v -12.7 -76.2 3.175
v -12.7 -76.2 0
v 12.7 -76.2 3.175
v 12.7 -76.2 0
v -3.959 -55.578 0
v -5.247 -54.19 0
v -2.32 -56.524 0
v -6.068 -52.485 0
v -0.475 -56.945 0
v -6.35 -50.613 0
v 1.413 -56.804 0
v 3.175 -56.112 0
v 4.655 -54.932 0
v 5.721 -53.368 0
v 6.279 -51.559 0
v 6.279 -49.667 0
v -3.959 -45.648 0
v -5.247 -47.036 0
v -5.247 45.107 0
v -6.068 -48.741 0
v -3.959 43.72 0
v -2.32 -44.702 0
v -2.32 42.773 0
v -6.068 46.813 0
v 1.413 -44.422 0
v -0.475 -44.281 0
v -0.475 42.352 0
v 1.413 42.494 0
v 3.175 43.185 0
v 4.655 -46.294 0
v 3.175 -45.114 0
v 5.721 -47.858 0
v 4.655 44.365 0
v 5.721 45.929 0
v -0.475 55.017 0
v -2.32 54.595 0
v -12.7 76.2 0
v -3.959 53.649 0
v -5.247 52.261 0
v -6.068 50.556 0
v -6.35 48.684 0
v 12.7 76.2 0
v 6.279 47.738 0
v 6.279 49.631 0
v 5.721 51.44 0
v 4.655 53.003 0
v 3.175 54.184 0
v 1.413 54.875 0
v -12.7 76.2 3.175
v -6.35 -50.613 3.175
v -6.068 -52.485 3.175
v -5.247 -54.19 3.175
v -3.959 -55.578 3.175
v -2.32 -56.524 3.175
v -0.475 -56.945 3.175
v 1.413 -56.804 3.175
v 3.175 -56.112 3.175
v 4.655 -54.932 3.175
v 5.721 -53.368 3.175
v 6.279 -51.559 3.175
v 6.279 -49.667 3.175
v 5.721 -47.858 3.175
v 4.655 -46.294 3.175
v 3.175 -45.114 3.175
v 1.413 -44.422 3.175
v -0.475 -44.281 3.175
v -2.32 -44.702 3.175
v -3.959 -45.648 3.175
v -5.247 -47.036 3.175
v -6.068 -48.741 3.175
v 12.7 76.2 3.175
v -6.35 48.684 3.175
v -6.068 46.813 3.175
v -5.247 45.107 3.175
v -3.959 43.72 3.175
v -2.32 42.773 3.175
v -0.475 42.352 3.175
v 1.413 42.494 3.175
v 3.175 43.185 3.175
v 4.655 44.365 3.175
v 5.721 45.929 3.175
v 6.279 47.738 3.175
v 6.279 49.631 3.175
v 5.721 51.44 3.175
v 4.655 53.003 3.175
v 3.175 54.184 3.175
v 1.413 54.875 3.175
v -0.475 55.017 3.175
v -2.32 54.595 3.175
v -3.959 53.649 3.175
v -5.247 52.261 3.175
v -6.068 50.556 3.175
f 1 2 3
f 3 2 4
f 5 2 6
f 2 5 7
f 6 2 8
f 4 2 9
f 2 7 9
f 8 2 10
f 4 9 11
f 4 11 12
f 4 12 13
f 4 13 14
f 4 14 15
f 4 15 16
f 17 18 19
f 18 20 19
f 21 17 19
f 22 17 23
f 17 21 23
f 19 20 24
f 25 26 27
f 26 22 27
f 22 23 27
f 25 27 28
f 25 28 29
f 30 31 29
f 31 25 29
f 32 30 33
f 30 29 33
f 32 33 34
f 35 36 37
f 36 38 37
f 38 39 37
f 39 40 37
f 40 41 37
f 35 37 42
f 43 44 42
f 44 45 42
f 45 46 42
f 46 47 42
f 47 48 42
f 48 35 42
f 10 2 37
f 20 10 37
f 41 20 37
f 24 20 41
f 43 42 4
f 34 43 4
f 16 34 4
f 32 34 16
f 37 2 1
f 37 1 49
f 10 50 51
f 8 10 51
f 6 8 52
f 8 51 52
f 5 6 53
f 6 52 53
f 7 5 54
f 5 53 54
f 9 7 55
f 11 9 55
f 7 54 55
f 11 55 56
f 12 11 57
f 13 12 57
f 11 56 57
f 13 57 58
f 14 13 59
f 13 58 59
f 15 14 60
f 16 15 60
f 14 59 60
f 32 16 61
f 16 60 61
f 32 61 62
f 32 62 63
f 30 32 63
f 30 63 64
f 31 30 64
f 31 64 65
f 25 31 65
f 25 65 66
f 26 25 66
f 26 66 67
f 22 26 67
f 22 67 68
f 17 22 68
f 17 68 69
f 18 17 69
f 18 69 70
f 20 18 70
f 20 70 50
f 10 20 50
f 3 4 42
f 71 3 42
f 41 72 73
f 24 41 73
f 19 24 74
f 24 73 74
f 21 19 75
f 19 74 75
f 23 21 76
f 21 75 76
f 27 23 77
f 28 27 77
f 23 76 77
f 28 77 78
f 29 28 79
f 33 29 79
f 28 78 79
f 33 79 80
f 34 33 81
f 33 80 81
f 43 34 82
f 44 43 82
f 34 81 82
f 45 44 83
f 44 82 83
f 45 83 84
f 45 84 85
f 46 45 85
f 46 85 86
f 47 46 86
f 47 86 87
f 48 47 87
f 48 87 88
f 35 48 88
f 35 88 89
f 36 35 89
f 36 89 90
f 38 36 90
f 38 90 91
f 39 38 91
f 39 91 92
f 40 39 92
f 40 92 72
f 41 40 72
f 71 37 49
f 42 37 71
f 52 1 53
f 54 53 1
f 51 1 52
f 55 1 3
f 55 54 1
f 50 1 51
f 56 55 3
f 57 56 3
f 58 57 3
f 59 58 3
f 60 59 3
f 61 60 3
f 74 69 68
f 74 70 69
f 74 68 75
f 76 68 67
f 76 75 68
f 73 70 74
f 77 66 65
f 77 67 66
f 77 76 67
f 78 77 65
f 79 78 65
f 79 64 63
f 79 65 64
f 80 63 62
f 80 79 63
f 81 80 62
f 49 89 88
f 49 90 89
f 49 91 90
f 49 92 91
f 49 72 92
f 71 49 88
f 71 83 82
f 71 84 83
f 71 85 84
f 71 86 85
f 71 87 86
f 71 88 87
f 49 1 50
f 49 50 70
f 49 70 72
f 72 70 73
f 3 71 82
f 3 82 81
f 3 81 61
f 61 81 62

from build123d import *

# Parameters (mm, degrees)
F0_W     = 25.4
F0_H     = 152.4
F1_DEPTH = 3.175
F3_D     = 12.7
F3_DEPTH = 25.4
F3_TIP   = 3.8154649308
F4_D     = 12.7
F4_DEPTH = 25.4
F4_TIP   = 3.8154649308


with BuildPart() as f1:
    # F0 (on Top) → F1 (new body)
    with BuildSketch(Plane.XY):
        Rectangle(F0_W, F0_H)
    extrude(amount=F1_DEPTH)

    # F3
    with Locations(Plane(origin=(0, 0, 0), x_dir=(1, 0, 0), z_dir=(0, 0, -1))):
        with Locations((0, -48.6843948386)):
            Hole(F3_D / 2, depth=F3_DEPTH)
            with Locations((0, 0, -(F3_DEPTH + F3_TIP / 2))):  # 118° drill point
                Cone(0, F3_D / 2, F3_TIP, mode=Mode.SUBTRACT)

    # F4
    with Locations(Plane(origin=(0, 0, 0), x_dir=(1, 0, 0), z_dir=(0, 0, -1))):
        with Locations((0, 50.612956785)):
            Hole(F4_D / 2, depth=F4_DEPTH)
            with Locations((0, 0, -(F4_DEPTH + F4_TIP / 2))):  # 118° drill point
                Cone(0, F4_D / 2, F4_TIP, mode=Mode.SUBTRACT)


solid = f1.part
